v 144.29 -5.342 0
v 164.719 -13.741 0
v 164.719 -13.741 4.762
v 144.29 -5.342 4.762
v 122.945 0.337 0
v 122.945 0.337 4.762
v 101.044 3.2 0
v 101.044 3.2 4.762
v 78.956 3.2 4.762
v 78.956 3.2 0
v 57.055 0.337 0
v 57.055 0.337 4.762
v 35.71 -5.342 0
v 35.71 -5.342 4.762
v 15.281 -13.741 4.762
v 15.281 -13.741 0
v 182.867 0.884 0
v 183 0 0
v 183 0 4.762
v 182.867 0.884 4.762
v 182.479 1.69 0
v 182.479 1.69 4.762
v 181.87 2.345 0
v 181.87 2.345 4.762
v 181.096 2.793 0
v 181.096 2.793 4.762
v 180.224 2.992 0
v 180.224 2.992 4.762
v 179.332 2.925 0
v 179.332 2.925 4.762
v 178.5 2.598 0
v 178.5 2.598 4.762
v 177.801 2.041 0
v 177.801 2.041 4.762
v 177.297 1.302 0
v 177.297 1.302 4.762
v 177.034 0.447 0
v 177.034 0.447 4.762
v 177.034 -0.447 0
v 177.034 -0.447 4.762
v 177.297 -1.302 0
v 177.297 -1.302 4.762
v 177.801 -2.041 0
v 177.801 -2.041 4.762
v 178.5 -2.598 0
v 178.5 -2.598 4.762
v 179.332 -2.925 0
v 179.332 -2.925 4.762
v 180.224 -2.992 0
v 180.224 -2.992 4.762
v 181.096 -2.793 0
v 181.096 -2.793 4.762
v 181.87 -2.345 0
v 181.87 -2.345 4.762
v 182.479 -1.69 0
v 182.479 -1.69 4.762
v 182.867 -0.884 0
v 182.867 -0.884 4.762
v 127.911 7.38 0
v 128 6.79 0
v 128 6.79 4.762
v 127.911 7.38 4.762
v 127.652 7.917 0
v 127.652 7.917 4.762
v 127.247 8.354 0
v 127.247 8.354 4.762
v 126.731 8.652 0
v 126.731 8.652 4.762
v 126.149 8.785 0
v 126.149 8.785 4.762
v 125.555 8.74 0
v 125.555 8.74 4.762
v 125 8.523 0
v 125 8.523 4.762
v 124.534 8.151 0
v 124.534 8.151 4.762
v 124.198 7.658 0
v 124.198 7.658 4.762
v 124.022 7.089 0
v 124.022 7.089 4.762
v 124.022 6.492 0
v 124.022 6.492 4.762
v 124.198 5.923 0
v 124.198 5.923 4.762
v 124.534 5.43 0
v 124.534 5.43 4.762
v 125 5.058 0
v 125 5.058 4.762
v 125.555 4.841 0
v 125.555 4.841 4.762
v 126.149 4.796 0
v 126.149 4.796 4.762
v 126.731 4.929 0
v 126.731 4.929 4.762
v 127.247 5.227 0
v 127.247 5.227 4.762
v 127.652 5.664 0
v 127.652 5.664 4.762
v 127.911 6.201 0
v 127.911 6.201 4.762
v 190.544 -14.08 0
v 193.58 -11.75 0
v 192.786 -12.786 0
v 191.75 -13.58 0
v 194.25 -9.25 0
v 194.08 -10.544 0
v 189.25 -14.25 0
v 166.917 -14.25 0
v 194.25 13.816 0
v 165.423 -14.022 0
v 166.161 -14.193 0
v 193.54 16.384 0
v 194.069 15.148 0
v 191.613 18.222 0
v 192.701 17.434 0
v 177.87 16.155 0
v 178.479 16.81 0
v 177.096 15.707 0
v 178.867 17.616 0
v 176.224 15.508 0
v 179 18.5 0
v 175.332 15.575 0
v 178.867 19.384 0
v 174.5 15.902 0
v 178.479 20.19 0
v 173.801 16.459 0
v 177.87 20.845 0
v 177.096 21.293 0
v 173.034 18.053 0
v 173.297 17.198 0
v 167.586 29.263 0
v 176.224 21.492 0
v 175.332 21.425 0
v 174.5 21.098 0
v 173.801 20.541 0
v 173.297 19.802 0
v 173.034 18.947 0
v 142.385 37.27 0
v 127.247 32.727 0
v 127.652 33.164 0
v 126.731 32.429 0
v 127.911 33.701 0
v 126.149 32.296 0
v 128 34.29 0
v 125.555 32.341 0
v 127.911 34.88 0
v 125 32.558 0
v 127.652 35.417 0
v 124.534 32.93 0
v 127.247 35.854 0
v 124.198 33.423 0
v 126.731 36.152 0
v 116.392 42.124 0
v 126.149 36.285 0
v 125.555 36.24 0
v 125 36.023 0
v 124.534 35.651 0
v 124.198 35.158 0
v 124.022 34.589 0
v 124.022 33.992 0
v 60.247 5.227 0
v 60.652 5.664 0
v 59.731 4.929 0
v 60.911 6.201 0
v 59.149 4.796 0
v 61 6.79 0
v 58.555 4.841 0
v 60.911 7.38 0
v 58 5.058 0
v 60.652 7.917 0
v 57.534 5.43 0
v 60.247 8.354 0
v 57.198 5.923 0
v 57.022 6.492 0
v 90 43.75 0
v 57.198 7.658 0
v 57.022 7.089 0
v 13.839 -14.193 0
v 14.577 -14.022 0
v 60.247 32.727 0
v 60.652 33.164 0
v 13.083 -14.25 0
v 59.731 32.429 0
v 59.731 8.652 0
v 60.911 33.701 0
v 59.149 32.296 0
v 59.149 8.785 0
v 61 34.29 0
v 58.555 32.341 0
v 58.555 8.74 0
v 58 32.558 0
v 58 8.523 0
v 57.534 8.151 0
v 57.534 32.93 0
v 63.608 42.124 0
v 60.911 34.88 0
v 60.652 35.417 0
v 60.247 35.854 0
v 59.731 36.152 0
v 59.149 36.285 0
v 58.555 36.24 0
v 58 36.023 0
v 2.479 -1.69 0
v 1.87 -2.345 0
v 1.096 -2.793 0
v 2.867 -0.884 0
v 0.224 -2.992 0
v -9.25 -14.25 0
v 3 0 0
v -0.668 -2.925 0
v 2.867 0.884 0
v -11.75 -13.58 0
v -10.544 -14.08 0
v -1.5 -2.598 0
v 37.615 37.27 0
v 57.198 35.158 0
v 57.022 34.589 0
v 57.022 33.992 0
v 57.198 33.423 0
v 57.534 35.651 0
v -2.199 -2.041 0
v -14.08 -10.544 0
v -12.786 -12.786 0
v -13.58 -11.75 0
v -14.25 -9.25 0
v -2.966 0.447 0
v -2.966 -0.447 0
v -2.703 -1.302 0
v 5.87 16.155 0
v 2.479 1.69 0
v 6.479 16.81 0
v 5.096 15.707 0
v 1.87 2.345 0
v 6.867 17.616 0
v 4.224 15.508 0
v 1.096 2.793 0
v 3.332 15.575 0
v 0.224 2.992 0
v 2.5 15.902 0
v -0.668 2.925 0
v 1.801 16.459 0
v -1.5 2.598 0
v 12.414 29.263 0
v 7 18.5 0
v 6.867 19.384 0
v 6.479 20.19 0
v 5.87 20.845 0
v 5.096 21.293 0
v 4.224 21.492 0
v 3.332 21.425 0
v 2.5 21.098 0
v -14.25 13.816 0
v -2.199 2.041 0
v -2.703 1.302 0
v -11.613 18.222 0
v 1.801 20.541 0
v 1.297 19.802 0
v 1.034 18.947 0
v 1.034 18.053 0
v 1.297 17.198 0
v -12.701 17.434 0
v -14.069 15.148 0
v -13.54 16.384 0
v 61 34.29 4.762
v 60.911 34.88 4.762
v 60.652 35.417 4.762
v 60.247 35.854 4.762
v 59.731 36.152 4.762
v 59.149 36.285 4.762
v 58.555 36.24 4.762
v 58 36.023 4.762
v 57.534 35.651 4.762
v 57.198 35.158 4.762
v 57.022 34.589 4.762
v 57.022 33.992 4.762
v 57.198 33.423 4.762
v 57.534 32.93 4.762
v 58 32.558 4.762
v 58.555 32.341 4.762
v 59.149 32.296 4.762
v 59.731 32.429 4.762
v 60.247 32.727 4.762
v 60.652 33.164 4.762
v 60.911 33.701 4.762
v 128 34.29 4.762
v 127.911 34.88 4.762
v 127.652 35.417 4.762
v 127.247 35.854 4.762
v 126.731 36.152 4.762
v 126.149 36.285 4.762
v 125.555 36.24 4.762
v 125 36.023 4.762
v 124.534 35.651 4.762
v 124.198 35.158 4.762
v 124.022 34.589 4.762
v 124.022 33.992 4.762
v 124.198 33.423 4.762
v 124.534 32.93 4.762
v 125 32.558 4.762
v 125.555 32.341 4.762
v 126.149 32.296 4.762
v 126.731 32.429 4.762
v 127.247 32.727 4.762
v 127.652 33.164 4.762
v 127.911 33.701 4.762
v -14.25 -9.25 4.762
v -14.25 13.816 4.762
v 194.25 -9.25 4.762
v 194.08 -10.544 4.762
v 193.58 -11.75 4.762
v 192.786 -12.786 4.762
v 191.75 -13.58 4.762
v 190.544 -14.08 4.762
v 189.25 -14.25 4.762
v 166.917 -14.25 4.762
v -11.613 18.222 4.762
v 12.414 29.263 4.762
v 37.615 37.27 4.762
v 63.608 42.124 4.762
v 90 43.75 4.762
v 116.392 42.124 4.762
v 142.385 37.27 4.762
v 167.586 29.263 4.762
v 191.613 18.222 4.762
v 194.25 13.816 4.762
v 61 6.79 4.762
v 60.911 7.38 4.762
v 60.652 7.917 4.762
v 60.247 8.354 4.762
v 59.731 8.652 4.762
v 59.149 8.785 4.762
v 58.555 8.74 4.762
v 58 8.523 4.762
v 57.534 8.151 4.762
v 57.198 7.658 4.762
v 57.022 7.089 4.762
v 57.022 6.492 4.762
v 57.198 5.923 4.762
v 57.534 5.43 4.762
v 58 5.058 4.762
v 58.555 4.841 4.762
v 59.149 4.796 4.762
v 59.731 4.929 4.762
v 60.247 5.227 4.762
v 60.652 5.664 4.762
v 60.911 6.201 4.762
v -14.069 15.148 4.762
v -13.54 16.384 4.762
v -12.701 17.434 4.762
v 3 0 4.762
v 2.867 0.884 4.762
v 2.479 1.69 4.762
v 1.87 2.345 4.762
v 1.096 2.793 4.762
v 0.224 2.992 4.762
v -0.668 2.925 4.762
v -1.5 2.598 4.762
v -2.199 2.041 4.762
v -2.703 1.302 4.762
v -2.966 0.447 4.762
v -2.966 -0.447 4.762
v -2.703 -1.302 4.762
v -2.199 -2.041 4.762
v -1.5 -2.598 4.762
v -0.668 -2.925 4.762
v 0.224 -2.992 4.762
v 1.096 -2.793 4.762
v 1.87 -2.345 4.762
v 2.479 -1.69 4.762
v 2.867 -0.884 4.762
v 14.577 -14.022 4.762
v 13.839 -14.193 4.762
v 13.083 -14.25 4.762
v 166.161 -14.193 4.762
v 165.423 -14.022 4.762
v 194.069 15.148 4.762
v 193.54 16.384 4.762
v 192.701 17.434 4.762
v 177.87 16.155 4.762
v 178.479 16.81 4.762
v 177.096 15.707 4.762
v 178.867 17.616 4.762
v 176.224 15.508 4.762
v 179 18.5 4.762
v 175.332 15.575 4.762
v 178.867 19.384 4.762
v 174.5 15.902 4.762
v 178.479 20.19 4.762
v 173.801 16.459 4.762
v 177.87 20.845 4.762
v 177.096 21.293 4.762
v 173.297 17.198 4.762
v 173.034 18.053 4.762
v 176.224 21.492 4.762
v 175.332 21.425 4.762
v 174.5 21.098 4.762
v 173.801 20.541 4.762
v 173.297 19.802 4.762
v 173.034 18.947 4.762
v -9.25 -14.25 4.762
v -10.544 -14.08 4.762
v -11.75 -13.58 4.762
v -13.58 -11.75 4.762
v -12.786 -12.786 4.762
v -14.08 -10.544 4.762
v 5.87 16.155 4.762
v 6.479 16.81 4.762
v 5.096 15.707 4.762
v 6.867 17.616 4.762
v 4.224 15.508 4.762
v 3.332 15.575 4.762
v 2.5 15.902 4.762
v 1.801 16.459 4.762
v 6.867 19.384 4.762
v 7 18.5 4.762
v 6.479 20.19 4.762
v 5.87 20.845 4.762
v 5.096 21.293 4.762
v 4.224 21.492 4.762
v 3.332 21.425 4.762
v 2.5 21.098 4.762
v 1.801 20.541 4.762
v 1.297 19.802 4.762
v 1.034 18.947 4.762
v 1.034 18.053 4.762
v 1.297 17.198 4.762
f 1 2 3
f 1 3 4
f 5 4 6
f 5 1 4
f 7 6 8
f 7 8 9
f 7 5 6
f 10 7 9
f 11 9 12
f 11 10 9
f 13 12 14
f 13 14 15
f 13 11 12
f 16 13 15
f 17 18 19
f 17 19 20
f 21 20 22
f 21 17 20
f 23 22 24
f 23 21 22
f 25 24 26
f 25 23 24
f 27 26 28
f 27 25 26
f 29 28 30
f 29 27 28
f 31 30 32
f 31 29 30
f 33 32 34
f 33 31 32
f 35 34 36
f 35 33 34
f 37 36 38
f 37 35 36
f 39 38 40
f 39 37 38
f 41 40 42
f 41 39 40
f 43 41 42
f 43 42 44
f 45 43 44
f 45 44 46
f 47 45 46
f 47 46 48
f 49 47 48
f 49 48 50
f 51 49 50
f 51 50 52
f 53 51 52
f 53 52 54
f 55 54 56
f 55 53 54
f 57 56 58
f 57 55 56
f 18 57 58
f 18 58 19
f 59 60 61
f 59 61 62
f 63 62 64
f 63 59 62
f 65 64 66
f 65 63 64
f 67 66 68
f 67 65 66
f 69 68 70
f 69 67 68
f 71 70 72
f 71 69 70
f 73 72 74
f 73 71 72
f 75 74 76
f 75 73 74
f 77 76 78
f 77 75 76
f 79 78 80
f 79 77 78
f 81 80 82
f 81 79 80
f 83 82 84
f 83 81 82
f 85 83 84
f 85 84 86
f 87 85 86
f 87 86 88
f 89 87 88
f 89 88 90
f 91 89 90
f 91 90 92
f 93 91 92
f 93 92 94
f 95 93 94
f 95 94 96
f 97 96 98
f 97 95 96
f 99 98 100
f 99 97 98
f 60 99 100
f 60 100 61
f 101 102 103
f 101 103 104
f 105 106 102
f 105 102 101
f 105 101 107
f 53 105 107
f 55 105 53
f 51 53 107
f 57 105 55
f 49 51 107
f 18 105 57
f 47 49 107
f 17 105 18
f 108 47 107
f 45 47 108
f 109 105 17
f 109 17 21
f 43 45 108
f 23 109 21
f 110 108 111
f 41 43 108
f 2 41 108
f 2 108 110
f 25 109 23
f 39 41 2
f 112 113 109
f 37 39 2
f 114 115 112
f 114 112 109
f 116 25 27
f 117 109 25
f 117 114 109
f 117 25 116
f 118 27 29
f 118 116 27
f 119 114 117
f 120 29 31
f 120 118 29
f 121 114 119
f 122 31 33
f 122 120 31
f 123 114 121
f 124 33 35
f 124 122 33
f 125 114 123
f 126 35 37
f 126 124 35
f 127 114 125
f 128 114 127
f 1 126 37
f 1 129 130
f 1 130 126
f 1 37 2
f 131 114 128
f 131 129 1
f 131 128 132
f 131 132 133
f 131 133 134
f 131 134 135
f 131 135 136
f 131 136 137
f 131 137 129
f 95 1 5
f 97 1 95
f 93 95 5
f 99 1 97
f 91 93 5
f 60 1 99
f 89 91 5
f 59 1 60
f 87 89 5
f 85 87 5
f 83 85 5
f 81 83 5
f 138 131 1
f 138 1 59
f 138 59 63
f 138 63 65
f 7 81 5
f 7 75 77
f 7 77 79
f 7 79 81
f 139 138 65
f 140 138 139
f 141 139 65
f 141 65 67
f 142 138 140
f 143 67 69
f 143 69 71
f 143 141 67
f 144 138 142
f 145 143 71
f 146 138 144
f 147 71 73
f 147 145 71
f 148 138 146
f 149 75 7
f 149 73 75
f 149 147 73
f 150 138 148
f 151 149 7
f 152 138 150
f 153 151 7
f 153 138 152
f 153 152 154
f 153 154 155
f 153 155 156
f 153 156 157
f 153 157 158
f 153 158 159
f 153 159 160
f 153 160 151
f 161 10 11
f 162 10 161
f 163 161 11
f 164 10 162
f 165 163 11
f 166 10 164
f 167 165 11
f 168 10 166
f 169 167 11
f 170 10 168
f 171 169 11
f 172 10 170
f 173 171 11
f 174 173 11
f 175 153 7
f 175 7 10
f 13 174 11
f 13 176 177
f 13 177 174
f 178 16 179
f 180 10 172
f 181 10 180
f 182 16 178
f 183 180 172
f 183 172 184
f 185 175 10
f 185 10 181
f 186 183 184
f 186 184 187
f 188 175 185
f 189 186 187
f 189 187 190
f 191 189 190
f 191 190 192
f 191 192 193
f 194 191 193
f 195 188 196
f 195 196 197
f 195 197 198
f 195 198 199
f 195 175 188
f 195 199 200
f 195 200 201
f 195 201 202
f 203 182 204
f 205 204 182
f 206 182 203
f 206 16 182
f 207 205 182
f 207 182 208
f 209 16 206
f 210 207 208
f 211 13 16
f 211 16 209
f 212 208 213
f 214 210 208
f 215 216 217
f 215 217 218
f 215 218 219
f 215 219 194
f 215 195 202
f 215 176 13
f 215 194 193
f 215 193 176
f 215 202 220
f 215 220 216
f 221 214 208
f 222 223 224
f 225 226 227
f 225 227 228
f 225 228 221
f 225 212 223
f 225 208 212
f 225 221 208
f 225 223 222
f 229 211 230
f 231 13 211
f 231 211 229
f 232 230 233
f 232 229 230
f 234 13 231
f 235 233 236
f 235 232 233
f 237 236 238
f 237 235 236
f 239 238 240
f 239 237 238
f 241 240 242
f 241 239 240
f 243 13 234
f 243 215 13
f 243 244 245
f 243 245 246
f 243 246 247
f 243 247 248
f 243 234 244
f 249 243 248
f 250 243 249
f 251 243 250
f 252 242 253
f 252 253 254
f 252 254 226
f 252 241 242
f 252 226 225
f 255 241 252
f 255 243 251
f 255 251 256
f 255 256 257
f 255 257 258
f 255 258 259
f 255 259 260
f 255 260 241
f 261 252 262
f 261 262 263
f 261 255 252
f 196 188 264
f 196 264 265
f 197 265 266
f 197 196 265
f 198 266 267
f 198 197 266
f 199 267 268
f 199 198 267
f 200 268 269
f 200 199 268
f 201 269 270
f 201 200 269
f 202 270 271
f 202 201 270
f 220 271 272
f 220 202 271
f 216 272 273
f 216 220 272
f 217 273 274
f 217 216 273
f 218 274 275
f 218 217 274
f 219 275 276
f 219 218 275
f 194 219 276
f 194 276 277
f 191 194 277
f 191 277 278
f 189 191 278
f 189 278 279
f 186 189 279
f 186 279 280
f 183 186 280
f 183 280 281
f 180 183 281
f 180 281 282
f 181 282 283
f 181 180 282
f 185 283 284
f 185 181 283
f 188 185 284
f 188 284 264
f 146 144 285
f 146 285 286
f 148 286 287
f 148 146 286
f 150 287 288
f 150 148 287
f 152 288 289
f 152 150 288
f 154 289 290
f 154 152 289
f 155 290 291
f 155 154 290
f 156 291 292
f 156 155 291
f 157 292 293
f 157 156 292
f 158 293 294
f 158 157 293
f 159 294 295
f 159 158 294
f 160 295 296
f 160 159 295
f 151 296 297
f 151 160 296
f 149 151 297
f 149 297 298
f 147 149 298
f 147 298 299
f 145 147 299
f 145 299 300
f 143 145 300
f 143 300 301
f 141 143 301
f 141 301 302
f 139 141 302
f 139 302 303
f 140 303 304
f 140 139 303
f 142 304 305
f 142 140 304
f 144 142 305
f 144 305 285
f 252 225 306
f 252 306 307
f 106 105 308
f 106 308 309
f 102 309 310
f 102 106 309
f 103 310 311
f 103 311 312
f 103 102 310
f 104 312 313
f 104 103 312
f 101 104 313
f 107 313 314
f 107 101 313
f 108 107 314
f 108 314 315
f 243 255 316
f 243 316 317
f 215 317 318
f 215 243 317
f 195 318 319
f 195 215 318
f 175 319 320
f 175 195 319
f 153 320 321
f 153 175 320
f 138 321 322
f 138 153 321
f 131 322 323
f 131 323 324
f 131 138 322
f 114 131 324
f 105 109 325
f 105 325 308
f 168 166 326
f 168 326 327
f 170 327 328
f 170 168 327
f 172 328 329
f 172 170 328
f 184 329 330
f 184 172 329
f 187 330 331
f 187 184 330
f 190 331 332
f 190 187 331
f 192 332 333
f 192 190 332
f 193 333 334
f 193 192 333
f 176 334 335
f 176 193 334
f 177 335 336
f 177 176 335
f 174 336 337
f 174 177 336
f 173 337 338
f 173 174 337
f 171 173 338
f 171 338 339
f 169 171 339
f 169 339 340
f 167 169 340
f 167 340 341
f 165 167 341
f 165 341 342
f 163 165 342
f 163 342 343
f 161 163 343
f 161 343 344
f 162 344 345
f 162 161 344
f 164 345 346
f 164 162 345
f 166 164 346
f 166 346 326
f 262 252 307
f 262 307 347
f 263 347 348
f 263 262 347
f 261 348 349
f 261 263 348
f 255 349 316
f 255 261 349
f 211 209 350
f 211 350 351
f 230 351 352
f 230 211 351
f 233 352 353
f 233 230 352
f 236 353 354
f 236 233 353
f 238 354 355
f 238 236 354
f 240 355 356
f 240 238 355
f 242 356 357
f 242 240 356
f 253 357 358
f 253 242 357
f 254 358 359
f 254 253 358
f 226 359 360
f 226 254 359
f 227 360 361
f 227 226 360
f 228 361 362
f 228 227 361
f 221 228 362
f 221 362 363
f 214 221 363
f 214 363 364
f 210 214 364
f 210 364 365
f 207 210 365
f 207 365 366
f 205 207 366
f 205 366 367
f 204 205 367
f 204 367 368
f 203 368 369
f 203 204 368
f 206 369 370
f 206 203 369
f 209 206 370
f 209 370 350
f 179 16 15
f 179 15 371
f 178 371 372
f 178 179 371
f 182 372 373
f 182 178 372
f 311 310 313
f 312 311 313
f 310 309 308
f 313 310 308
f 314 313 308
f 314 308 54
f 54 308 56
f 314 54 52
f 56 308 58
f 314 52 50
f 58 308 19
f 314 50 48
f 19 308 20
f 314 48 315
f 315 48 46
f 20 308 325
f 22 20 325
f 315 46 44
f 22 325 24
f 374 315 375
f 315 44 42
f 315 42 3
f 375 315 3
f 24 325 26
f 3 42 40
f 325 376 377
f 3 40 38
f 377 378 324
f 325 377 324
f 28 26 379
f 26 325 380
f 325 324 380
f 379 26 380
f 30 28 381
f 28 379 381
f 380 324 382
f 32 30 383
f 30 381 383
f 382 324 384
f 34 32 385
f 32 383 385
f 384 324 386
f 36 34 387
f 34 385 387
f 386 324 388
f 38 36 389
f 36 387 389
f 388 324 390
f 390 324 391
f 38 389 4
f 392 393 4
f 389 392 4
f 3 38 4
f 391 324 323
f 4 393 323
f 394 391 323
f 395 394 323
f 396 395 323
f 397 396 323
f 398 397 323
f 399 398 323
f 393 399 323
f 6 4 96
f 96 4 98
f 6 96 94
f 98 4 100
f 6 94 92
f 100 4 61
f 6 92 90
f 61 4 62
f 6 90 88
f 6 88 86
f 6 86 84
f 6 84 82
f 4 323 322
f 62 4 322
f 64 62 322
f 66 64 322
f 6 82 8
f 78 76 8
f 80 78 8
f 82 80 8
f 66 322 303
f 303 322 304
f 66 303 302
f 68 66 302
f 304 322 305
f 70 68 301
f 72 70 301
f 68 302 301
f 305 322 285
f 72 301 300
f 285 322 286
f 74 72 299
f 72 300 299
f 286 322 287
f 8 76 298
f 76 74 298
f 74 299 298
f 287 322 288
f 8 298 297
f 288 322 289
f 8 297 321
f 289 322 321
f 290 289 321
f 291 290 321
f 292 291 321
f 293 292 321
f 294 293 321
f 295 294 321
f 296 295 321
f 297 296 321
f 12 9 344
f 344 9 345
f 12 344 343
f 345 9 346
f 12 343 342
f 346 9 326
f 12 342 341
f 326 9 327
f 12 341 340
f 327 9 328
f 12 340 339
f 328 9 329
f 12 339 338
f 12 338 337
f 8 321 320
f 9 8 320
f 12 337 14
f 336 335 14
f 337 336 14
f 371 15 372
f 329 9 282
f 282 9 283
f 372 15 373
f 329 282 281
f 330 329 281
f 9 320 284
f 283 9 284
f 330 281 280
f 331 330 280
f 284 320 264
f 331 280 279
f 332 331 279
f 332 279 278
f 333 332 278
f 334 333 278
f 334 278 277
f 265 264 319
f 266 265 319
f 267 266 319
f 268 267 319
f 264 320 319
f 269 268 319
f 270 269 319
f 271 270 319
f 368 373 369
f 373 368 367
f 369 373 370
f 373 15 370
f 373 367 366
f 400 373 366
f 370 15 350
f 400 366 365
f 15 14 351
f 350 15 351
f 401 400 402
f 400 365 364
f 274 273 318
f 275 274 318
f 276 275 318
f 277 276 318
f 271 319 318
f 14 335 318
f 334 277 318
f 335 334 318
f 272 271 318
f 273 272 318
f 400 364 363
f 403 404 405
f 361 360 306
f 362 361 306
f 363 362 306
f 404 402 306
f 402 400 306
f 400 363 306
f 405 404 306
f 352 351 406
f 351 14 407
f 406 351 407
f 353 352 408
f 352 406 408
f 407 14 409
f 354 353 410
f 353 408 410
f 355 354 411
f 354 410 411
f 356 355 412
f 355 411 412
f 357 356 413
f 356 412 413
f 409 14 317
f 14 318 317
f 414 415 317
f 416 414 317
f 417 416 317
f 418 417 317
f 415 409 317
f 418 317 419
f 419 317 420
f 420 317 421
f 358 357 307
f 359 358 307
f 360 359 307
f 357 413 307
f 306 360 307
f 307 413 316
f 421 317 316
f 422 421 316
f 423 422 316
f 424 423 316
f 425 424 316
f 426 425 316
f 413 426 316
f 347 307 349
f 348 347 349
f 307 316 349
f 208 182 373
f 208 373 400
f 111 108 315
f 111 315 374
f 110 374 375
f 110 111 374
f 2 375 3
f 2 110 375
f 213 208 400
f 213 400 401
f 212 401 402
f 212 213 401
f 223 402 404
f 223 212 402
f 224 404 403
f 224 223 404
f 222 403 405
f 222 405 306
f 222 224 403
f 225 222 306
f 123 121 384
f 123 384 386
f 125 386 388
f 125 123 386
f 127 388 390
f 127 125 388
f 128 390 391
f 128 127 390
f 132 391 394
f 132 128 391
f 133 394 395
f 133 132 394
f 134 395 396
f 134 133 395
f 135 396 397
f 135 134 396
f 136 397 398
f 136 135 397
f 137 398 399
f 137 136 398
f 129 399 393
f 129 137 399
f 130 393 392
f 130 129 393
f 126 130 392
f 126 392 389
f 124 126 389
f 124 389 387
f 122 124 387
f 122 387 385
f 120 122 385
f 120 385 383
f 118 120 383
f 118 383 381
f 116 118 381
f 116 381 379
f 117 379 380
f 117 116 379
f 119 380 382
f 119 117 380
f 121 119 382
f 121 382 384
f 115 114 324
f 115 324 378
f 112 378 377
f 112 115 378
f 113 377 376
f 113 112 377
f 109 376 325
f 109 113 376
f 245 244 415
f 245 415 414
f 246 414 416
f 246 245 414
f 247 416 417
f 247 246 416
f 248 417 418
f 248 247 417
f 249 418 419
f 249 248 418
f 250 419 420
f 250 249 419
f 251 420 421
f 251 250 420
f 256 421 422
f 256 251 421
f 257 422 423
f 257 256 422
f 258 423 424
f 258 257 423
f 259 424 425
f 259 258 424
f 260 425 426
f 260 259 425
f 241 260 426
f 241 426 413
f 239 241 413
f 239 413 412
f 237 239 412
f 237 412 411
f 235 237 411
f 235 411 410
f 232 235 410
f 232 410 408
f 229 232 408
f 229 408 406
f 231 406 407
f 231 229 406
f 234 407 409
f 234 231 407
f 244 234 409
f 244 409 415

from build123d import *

# Parameters (mm, degrees)
SKETCH1_R           = 2
SKETCH1_R_2         = 3
BOSS_EXTRUDE1_DEPTH = 4.7625


with BuildPart() as part:
    # Sketch1 → Boss-Extrude1 (new body)
    with BuildSketch(Plane.XY):
        with BuildLine():
            Line((-14.25, -9.25), (-14.25, 13.816035512))
            ThreePointArc((-14.25, 13.816035512), (-13.540423999, 16.383575561), (-11.613095238, 18.222369691))
            ThreePointArc((-11.613095238, 18.222369691), (90, 43.75), (191.613095238, 18.222369691))
            ThreePointArc((191.613095238, 18.222369691), (193.540423999, 16.383575561), (194.25, 13.816035512))
            Line((194.25, 13.816035512), (194.25, -9.25))
            ThreePointArc((194.25, -9.25), (192.785533906, -12.785533906), (189.25, -14.25))
            Line((189.25, -14.25), (166.91656424, -14.25))
            ThreePointArc((166.91656424, -14.25), (165.788685845, -14.121128239), (164.718948119, -13.74115613))
            ThreePointArc((164.718948119, -13.74115613), (90, 3.55953545), (15.281051881, -13.74115613))
            ThreePointArc((15.281051881, -13.74115613), (14.211314155, -14.121128239), (13.08343576, -14.25))
            Line((13.08343576, -14.25), (-9.25, -14.25))
            ThreePointArc((-9.25, -14.25), (-12.785533906, -12.785533906), (-14.25, -9.25))
        make_face()
        with Locations((59, 34.290496826)):
            Circle(SKETCH1_R, mode=Mode.SUBTRACT)
        with Locations((59, 6.790496826)):
            Circle(SKETCH1_R, mode=Mode.SUBTRACT)
        with Locations((126, 34.290496826)):
            Circle(SKETCH1_R, mode=Mode.SUBTRACT)
        with Locations((126, 6.790496826)):
            Circle(SKETCH1_R, mode=Mode.SUBTRACT)
        with Locations((180, 0)):
            Circle(SKETCH1_R_2, mode=Mode.SUBTRACT)
        Circle(SKETCH1_R_2, mode=Mode.SUBTRACT)
        with Locations((4, 18.5)):
            Circle(SKETCH1_R_2, mode=Mode.SUBTRACT)
        with Locations((176, 18.5)):
            Circle(SKETCH1_R_2, mode=Mode.SUBTRACT)
    extrude(amount=BOSS_EXTRUDE1_DEPTH)


solid = part.part
